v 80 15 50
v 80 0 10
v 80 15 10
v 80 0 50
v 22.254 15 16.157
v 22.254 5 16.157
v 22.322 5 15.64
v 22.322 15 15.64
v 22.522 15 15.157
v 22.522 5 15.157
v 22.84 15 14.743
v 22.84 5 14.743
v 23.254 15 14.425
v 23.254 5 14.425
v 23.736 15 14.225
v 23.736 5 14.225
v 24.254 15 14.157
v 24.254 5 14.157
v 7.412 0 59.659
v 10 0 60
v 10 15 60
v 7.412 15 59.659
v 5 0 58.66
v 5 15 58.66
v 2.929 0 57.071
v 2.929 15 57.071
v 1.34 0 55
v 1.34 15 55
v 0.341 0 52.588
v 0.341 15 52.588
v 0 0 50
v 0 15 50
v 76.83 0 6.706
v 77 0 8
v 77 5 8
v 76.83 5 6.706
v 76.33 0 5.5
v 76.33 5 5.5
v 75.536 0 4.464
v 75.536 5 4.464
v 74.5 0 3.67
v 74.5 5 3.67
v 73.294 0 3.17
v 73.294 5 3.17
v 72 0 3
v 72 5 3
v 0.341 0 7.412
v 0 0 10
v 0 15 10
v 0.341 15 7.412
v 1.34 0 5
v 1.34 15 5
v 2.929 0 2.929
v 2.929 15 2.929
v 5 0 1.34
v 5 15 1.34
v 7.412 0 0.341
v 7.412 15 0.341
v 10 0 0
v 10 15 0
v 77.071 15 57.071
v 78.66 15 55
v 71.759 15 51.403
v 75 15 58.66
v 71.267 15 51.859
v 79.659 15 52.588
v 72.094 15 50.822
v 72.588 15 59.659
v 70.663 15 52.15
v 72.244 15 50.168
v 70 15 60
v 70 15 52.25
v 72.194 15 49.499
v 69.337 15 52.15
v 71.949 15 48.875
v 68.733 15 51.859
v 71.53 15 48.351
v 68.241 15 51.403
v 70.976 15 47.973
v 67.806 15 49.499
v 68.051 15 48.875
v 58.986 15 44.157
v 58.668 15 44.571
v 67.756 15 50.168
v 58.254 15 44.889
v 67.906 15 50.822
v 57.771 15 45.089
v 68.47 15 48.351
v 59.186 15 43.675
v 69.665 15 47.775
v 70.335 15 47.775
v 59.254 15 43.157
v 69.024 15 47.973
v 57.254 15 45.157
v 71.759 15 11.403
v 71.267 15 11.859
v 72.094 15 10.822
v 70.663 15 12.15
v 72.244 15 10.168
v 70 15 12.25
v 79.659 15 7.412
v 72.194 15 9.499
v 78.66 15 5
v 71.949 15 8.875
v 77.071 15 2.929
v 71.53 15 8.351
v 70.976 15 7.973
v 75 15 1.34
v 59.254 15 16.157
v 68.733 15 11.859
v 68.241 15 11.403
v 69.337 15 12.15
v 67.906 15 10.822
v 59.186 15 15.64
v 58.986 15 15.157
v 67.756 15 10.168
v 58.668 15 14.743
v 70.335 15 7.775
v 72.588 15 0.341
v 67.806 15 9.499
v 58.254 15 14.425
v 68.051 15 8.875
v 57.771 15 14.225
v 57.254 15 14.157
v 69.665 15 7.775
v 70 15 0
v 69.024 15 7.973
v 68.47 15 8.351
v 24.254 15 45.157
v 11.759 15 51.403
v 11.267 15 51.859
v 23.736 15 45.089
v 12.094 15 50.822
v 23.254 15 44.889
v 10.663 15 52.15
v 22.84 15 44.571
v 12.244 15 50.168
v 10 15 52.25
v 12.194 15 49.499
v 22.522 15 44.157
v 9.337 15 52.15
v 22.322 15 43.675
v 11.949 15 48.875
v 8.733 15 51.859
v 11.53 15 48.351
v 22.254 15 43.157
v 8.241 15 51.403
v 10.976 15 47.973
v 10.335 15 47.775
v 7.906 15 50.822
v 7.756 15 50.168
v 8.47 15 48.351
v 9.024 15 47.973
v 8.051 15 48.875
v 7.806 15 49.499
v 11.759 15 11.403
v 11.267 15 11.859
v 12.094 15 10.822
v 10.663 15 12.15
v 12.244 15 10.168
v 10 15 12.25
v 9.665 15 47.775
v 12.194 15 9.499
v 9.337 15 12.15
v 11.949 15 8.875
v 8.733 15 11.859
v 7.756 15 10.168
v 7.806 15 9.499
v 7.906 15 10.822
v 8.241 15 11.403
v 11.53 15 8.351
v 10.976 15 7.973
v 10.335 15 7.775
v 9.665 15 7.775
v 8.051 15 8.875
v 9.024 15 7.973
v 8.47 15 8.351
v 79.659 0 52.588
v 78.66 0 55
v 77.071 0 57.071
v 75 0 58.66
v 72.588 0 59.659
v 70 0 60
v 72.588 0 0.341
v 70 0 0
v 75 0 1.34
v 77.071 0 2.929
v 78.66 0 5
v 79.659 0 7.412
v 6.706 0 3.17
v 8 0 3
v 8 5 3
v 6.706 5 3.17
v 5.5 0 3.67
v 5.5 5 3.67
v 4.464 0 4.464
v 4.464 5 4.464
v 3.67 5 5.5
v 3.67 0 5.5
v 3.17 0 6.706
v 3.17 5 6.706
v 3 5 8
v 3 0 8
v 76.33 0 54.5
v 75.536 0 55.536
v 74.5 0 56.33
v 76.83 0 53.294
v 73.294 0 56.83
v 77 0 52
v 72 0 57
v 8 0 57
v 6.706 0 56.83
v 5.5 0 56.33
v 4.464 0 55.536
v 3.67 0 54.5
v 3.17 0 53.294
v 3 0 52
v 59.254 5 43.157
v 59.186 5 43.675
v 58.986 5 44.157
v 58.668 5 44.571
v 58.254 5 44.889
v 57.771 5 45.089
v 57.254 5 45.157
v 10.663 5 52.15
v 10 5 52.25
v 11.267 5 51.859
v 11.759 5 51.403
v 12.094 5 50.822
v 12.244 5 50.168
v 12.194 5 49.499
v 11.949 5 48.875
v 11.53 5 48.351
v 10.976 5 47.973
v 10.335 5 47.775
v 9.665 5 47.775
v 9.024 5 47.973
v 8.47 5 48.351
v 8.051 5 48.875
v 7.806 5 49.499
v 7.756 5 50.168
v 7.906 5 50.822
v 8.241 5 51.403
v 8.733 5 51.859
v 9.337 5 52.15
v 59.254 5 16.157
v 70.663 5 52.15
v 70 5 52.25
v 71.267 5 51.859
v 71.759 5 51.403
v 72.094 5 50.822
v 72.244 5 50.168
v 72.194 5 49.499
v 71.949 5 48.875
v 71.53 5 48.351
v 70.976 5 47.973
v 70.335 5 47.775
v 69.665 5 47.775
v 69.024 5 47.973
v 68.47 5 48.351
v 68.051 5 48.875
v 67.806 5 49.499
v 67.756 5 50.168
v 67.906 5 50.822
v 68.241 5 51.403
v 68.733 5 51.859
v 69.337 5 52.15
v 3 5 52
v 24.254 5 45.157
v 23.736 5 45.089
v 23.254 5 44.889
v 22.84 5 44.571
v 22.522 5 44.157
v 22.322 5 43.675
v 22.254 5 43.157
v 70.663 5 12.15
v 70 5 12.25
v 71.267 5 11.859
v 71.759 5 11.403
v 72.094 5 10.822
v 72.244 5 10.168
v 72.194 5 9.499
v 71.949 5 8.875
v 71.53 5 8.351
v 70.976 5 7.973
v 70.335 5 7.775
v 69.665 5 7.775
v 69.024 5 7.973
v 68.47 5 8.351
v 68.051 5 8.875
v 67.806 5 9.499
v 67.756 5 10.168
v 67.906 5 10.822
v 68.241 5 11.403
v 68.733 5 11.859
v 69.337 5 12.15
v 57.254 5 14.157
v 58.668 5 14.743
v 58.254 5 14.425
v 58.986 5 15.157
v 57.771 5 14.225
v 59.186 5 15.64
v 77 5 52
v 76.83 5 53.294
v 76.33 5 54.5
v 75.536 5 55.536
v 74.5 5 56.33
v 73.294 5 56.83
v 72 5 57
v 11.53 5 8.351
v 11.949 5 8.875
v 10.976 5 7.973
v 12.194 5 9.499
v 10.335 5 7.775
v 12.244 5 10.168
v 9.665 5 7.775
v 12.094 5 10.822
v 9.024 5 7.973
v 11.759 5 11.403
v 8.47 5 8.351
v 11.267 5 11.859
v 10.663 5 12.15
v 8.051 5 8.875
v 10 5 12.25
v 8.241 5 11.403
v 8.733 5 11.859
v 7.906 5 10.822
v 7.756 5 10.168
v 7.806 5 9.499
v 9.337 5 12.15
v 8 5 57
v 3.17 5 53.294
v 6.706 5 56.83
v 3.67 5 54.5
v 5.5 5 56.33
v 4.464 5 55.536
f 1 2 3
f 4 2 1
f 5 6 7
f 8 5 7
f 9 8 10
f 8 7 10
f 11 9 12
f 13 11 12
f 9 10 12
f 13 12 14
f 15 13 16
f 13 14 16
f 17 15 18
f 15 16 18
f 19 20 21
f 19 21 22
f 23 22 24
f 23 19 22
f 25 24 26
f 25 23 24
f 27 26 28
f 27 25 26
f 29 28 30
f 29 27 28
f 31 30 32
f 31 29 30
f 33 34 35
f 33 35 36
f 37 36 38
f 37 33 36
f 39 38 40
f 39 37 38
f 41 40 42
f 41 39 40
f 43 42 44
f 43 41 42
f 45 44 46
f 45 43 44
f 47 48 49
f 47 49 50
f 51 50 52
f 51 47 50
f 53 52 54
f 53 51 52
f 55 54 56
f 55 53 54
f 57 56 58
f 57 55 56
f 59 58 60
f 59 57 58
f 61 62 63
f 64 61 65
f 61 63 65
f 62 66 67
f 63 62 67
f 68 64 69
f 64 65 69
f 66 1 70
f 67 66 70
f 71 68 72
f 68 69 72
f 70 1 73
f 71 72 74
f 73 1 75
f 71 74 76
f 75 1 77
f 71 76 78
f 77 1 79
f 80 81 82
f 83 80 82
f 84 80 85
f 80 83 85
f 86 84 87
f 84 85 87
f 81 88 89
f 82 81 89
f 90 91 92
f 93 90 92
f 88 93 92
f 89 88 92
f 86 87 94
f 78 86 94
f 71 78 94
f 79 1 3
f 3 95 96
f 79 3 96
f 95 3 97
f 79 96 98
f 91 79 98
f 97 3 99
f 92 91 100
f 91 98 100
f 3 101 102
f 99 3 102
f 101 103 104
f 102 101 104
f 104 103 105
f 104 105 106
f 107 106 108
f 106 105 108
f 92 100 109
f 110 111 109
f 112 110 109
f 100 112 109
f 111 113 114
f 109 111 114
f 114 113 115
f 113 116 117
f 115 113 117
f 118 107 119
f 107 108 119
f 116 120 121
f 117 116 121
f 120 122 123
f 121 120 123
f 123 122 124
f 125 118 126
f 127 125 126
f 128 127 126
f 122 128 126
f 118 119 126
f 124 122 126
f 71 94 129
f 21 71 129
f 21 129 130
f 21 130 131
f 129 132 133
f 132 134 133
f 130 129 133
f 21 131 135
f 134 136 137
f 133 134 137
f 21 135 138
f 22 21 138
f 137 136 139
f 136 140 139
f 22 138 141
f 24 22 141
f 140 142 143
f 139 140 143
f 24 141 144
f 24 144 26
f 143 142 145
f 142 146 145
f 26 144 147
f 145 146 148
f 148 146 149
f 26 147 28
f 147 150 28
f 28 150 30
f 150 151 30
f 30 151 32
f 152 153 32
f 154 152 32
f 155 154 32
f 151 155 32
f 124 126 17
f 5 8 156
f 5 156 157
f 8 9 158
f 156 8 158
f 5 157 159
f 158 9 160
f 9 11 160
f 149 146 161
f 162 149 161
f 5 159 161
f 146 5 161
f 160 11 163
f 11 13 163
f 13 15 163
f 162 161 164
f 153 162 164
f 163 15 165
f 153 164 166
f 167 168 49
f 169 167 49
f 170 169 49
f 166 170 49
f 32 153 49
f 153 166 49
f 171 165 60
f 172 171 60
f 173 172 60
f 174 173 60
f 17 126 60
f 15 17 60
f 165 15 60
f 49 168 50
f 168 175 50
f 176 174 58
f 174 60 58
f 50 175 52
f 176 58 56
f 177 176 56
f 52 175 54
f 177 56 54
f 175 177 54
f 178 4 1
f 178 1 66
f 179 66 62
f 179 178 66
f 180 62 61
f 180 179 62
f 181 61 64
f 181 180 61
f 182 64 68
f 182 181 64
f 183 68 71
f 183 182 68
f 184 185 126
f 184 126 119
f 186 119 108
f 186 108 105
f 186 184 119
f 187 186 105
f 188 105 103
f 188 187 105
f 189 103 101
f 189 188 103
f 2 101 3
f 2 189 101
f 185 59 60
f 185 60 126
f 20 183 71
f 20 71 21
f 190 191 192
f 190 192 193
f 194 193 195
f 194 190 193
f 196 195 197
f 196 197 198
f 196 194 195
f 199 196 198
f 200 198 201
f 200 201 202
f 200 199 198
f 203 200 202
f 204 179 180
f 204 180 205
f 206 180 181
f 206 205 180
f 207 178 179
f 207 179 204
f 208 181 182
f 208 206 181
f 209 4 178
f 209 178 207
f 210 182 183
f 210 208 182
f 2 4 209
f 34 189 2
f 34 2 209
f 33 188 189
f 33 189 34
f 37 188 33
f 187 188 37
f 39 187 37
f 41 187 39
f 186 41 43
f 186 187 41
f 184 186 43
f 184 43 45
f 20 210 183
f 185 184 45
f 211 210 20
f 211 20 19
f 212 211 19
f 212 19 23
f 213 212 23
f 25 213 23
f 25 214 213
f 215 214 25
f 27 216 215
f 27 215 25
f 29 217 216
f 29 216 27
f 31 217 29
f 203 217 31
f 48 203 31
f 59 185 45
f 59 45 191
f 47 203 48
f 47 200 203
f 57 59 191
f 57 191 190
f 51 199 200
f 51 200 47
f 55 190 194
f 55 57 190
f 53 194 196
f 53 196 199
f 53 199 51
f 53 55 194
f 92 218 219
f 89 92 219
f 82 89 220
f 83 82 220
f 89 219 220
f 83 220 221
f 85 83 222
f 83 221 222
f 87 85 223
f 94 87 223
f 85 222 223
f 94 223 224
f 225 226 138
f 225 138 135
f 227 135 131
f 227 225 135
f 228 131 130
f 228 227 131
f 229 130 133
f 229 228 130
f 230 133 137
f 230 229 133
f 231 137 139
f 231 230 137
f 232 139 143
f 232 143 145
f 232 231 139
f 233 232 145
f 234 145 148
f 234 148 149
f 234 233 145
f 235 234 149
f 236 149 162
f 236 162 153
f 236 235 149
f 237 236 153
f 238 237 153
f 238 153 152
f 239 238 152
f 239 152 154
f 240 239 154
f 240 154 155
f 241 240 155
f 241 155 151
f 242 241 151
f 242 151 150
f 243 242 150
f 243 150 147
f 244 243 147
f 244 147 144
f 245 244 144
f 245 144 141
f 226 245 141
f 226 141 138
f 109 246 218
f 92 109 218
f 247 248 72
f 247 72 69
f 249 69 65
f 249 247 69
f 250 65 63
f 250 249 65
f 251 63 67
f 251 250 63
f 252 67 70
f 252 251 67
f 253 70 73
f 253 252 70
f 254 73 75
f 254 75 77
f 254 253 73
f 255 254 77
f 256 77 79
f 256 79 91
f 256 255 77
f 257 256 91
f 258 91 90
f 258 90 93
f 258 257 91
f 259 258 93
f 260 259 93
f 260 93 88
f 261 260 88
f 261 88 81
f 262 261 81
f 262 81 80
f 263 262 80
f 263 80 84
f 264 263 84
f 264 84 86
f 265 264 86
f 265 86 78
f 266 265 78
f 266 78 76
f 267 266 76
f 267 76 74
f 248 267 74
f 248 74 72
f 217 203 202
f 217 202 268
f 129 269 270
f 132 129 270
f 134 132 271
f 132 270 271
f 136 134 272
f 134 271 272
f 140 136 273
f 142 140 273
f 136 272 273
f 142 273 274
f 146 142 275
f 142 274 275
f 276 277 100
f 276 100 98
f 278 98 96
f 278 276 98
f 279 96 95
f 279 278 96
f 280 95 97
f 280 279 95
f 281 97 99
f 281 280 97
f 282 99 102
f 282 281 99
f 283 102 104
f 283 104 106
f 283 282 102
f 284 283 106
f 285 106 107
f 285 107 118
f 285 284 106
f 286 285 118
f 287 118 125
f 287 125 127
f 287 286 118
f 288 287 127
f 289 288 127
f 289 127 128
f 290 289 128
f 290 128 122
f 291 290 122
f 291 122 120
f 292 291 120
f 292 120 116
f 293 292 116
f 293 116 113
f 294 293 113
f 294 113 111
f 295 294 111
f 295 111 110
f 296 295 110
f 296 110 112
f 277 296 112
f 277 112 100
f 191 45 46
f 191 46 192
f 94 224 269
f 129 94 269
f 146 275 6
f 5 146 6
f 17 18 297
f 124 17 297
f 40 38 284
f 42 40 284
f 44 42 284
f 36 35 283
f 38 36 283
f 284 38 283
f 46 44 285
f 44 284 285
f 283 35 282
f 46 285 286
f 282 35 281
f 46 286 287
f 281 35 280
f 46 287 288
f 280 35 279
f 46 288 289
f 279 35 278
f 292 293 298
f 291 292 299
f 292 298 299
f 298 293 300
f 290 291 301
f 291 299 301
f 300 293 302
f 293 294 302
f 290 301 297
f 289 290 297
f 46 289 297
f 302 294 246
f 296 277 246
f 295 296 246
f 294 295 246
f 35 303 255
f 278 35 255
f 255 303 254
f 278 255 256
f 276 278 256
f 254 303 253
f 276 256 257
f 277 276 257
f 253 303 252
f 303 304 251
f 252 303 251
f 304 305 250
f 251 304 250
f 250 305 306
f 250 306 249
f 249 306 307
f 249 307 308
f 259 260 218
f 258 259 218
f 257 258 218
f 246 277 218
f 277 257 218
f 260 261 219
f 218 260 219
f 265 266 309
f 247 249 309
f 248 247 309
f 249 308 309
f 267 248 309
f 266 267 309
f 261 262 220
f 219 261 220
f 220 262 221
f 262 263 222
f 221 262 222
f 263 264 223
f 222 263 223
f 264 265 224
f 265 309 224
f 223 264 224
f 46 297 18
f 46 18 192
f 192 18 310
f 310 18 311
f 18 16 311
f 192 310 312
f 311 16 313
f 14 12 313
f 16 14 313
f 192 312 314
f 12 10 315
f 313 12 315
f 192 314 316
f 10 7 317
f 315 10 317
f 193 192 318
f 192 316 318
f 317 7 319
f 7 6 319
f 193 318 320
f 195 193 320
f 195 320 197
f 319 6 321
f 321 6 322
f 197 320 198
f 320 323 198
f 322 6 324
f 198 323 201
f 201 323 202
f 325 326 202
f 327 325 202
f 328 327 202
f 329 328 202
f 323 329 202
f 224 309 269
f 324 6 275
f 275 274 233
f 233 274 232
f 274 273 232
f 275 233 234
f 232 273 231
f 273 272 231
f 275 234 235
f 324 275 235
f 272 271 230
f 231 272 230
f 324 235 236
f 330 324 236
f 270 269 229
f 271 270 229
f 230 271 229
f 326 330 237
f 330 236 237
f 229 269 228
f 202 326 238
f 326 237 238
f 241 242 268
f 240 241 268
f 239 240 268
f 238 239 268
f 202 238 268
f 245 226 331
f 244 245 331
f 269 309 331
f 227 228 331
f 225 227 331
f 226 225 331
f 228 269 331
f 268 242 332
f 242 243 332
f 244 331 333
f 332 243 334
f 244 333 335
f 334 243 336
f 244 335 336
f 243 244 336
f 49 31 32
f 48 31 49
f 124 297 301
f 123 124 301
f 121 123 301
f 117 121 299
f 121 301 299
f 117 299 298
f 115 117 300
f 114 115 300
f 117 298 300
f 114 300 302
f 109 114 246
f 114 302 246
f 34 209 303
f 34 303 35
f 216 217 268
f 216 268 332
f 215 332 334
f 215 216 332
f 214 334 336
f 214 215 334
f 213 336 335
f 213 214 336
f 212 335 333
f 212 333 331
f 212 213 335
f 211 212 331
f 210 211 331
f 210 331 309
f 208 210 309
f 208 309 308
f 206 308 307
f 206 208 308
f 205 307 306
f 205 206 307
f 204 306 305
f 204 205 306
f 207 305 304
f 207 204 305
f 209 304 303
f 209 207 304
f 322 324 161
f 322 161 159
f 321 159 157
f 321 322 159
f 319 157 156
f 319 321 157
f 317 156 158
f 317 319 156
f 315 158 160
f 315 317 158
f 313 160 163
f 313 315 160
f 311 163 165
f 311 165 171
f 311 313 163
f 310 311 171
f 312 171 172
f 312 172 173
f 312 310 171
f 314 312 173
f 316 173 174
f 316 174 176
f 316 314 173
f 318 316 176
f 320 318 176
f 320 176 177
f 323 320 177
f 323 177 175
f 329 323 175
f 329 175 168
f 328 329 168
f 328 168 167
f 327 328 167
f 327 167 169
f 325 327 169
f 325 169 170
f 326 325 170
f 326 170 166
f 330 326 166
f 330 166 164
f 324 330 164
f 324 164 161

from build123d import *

# Parameters (mm, degrees)
ESQUISSE1_R             = 2.25
BOSS_EXTRU_1_DEPTH      = 15
ENL_V_MAT_EXTRU_1_DEPTH = 5


with BuildPart() as part:
    # Esquisse1 → Boss.-Extru.1 (new body)
    with BuildSketch(Plane(origin=(0, 0, 0), x_dir=(1, 0, 0), z_dir=(0, 1, 0))):
        with BuildLine():
            Line((10, 0), (70, 0))
            ThreePointArc((70, 0), (77.071067812, -2.928932188), (80, -10))
            Line((80, -10), (80, -50))
            ThreePointArc((80, -50), (77.071067812, -57.071067812), (70, -60))
            Line((70, -60), (10, -60))
            ThreePointArc((10, -60), (2.928932188, -57.071067812), (0, -50))
            Line((0, -50), (0, -10))
            ThreePointArc((0, -10), (2.928932188, -2.928932188), (10, 0))
        make_face()
        with Locations(Location((10, -10, 0), (0, 0, 270))):
            Circle(ESQUISSE1_R, mode=Mode.SUBTRACT)
        with Locations(Location((70, -10, 0), (0, 0, 270))):
            Circle(ESQUISSE1_R, mode=Mode.SUBTRACT)
        with Locations(Location((10, -50, 0), (0, 0, 270))):
            Circle(ESQUISSE1_R, mode=Mode.SUBTRACT)
        with Locations(Location((70, -50, 0), (0, 0, 270))):
            Circle(ESQUISSE1_R, mode=Mode.SUBTRACT)
        with BuildLine():
            Line((24.253765099, -14.157246889), (57.253765099, -14.157246889))
            ThreePointArc((57.253765099, -14.157246889), (58.667978662, -14.743033326), (59.253765099, -16.157246889))
            Line((59.253765099, -16.157246889), (59.253765099, -43.157246889))
            ThreePointArc((59.253765099, -43.157246889), (58.667978662, -44.571460451), (57.253765099, -45.157246889))
            Line((57.253765099, -45.157246889), (24.253765099, -45.157246889))
            ThreePointArc((24.253765099, -45.157246889), (22.839551537, -44.571460451), (22.253765099, -43.157246889))
            Line((22.253765099, -43.157246889), (22.253765099, -16.157246889))
            ThreePointArc((22.253765099, -16.157246889), (22.839551537, -14.743033326), (24.253765099, -14.157246889))
        make_face(mode=Mode.SUBTRACT)
    extrude(amount=BOSS_EXTRU_1_DEPTH)

    # Esquisse2 → Enlèv. mat.-Extru.1 (cut)
    with BuildSketch(Plane.XZ):
        with BuildLine():
            Line((8, 57), (72, 57))
            ThreePointArc((72, 57), (75.535533906, 55.535533906), (77, 52))
            Line((77, 52), (77, 8))
            ThreePointArc((77, 8), (75.535533906, 4.464466094), (72, 3))
            Line((72, 3), (8, 3))
            ThreePointArc((8, 3), (4.464466094, 4.464466094), (3, 8))
            Line((3, 8), (3, 52))
            ThreePointArc((3, 52), (4.464466094, 55.535533906), (8, 57))
        make_face()
    extrude(amount=-ENL_V_MAT_EXTRU_1_DEPTH, mode=Mode.SUBTRACT)


solid = part.part
